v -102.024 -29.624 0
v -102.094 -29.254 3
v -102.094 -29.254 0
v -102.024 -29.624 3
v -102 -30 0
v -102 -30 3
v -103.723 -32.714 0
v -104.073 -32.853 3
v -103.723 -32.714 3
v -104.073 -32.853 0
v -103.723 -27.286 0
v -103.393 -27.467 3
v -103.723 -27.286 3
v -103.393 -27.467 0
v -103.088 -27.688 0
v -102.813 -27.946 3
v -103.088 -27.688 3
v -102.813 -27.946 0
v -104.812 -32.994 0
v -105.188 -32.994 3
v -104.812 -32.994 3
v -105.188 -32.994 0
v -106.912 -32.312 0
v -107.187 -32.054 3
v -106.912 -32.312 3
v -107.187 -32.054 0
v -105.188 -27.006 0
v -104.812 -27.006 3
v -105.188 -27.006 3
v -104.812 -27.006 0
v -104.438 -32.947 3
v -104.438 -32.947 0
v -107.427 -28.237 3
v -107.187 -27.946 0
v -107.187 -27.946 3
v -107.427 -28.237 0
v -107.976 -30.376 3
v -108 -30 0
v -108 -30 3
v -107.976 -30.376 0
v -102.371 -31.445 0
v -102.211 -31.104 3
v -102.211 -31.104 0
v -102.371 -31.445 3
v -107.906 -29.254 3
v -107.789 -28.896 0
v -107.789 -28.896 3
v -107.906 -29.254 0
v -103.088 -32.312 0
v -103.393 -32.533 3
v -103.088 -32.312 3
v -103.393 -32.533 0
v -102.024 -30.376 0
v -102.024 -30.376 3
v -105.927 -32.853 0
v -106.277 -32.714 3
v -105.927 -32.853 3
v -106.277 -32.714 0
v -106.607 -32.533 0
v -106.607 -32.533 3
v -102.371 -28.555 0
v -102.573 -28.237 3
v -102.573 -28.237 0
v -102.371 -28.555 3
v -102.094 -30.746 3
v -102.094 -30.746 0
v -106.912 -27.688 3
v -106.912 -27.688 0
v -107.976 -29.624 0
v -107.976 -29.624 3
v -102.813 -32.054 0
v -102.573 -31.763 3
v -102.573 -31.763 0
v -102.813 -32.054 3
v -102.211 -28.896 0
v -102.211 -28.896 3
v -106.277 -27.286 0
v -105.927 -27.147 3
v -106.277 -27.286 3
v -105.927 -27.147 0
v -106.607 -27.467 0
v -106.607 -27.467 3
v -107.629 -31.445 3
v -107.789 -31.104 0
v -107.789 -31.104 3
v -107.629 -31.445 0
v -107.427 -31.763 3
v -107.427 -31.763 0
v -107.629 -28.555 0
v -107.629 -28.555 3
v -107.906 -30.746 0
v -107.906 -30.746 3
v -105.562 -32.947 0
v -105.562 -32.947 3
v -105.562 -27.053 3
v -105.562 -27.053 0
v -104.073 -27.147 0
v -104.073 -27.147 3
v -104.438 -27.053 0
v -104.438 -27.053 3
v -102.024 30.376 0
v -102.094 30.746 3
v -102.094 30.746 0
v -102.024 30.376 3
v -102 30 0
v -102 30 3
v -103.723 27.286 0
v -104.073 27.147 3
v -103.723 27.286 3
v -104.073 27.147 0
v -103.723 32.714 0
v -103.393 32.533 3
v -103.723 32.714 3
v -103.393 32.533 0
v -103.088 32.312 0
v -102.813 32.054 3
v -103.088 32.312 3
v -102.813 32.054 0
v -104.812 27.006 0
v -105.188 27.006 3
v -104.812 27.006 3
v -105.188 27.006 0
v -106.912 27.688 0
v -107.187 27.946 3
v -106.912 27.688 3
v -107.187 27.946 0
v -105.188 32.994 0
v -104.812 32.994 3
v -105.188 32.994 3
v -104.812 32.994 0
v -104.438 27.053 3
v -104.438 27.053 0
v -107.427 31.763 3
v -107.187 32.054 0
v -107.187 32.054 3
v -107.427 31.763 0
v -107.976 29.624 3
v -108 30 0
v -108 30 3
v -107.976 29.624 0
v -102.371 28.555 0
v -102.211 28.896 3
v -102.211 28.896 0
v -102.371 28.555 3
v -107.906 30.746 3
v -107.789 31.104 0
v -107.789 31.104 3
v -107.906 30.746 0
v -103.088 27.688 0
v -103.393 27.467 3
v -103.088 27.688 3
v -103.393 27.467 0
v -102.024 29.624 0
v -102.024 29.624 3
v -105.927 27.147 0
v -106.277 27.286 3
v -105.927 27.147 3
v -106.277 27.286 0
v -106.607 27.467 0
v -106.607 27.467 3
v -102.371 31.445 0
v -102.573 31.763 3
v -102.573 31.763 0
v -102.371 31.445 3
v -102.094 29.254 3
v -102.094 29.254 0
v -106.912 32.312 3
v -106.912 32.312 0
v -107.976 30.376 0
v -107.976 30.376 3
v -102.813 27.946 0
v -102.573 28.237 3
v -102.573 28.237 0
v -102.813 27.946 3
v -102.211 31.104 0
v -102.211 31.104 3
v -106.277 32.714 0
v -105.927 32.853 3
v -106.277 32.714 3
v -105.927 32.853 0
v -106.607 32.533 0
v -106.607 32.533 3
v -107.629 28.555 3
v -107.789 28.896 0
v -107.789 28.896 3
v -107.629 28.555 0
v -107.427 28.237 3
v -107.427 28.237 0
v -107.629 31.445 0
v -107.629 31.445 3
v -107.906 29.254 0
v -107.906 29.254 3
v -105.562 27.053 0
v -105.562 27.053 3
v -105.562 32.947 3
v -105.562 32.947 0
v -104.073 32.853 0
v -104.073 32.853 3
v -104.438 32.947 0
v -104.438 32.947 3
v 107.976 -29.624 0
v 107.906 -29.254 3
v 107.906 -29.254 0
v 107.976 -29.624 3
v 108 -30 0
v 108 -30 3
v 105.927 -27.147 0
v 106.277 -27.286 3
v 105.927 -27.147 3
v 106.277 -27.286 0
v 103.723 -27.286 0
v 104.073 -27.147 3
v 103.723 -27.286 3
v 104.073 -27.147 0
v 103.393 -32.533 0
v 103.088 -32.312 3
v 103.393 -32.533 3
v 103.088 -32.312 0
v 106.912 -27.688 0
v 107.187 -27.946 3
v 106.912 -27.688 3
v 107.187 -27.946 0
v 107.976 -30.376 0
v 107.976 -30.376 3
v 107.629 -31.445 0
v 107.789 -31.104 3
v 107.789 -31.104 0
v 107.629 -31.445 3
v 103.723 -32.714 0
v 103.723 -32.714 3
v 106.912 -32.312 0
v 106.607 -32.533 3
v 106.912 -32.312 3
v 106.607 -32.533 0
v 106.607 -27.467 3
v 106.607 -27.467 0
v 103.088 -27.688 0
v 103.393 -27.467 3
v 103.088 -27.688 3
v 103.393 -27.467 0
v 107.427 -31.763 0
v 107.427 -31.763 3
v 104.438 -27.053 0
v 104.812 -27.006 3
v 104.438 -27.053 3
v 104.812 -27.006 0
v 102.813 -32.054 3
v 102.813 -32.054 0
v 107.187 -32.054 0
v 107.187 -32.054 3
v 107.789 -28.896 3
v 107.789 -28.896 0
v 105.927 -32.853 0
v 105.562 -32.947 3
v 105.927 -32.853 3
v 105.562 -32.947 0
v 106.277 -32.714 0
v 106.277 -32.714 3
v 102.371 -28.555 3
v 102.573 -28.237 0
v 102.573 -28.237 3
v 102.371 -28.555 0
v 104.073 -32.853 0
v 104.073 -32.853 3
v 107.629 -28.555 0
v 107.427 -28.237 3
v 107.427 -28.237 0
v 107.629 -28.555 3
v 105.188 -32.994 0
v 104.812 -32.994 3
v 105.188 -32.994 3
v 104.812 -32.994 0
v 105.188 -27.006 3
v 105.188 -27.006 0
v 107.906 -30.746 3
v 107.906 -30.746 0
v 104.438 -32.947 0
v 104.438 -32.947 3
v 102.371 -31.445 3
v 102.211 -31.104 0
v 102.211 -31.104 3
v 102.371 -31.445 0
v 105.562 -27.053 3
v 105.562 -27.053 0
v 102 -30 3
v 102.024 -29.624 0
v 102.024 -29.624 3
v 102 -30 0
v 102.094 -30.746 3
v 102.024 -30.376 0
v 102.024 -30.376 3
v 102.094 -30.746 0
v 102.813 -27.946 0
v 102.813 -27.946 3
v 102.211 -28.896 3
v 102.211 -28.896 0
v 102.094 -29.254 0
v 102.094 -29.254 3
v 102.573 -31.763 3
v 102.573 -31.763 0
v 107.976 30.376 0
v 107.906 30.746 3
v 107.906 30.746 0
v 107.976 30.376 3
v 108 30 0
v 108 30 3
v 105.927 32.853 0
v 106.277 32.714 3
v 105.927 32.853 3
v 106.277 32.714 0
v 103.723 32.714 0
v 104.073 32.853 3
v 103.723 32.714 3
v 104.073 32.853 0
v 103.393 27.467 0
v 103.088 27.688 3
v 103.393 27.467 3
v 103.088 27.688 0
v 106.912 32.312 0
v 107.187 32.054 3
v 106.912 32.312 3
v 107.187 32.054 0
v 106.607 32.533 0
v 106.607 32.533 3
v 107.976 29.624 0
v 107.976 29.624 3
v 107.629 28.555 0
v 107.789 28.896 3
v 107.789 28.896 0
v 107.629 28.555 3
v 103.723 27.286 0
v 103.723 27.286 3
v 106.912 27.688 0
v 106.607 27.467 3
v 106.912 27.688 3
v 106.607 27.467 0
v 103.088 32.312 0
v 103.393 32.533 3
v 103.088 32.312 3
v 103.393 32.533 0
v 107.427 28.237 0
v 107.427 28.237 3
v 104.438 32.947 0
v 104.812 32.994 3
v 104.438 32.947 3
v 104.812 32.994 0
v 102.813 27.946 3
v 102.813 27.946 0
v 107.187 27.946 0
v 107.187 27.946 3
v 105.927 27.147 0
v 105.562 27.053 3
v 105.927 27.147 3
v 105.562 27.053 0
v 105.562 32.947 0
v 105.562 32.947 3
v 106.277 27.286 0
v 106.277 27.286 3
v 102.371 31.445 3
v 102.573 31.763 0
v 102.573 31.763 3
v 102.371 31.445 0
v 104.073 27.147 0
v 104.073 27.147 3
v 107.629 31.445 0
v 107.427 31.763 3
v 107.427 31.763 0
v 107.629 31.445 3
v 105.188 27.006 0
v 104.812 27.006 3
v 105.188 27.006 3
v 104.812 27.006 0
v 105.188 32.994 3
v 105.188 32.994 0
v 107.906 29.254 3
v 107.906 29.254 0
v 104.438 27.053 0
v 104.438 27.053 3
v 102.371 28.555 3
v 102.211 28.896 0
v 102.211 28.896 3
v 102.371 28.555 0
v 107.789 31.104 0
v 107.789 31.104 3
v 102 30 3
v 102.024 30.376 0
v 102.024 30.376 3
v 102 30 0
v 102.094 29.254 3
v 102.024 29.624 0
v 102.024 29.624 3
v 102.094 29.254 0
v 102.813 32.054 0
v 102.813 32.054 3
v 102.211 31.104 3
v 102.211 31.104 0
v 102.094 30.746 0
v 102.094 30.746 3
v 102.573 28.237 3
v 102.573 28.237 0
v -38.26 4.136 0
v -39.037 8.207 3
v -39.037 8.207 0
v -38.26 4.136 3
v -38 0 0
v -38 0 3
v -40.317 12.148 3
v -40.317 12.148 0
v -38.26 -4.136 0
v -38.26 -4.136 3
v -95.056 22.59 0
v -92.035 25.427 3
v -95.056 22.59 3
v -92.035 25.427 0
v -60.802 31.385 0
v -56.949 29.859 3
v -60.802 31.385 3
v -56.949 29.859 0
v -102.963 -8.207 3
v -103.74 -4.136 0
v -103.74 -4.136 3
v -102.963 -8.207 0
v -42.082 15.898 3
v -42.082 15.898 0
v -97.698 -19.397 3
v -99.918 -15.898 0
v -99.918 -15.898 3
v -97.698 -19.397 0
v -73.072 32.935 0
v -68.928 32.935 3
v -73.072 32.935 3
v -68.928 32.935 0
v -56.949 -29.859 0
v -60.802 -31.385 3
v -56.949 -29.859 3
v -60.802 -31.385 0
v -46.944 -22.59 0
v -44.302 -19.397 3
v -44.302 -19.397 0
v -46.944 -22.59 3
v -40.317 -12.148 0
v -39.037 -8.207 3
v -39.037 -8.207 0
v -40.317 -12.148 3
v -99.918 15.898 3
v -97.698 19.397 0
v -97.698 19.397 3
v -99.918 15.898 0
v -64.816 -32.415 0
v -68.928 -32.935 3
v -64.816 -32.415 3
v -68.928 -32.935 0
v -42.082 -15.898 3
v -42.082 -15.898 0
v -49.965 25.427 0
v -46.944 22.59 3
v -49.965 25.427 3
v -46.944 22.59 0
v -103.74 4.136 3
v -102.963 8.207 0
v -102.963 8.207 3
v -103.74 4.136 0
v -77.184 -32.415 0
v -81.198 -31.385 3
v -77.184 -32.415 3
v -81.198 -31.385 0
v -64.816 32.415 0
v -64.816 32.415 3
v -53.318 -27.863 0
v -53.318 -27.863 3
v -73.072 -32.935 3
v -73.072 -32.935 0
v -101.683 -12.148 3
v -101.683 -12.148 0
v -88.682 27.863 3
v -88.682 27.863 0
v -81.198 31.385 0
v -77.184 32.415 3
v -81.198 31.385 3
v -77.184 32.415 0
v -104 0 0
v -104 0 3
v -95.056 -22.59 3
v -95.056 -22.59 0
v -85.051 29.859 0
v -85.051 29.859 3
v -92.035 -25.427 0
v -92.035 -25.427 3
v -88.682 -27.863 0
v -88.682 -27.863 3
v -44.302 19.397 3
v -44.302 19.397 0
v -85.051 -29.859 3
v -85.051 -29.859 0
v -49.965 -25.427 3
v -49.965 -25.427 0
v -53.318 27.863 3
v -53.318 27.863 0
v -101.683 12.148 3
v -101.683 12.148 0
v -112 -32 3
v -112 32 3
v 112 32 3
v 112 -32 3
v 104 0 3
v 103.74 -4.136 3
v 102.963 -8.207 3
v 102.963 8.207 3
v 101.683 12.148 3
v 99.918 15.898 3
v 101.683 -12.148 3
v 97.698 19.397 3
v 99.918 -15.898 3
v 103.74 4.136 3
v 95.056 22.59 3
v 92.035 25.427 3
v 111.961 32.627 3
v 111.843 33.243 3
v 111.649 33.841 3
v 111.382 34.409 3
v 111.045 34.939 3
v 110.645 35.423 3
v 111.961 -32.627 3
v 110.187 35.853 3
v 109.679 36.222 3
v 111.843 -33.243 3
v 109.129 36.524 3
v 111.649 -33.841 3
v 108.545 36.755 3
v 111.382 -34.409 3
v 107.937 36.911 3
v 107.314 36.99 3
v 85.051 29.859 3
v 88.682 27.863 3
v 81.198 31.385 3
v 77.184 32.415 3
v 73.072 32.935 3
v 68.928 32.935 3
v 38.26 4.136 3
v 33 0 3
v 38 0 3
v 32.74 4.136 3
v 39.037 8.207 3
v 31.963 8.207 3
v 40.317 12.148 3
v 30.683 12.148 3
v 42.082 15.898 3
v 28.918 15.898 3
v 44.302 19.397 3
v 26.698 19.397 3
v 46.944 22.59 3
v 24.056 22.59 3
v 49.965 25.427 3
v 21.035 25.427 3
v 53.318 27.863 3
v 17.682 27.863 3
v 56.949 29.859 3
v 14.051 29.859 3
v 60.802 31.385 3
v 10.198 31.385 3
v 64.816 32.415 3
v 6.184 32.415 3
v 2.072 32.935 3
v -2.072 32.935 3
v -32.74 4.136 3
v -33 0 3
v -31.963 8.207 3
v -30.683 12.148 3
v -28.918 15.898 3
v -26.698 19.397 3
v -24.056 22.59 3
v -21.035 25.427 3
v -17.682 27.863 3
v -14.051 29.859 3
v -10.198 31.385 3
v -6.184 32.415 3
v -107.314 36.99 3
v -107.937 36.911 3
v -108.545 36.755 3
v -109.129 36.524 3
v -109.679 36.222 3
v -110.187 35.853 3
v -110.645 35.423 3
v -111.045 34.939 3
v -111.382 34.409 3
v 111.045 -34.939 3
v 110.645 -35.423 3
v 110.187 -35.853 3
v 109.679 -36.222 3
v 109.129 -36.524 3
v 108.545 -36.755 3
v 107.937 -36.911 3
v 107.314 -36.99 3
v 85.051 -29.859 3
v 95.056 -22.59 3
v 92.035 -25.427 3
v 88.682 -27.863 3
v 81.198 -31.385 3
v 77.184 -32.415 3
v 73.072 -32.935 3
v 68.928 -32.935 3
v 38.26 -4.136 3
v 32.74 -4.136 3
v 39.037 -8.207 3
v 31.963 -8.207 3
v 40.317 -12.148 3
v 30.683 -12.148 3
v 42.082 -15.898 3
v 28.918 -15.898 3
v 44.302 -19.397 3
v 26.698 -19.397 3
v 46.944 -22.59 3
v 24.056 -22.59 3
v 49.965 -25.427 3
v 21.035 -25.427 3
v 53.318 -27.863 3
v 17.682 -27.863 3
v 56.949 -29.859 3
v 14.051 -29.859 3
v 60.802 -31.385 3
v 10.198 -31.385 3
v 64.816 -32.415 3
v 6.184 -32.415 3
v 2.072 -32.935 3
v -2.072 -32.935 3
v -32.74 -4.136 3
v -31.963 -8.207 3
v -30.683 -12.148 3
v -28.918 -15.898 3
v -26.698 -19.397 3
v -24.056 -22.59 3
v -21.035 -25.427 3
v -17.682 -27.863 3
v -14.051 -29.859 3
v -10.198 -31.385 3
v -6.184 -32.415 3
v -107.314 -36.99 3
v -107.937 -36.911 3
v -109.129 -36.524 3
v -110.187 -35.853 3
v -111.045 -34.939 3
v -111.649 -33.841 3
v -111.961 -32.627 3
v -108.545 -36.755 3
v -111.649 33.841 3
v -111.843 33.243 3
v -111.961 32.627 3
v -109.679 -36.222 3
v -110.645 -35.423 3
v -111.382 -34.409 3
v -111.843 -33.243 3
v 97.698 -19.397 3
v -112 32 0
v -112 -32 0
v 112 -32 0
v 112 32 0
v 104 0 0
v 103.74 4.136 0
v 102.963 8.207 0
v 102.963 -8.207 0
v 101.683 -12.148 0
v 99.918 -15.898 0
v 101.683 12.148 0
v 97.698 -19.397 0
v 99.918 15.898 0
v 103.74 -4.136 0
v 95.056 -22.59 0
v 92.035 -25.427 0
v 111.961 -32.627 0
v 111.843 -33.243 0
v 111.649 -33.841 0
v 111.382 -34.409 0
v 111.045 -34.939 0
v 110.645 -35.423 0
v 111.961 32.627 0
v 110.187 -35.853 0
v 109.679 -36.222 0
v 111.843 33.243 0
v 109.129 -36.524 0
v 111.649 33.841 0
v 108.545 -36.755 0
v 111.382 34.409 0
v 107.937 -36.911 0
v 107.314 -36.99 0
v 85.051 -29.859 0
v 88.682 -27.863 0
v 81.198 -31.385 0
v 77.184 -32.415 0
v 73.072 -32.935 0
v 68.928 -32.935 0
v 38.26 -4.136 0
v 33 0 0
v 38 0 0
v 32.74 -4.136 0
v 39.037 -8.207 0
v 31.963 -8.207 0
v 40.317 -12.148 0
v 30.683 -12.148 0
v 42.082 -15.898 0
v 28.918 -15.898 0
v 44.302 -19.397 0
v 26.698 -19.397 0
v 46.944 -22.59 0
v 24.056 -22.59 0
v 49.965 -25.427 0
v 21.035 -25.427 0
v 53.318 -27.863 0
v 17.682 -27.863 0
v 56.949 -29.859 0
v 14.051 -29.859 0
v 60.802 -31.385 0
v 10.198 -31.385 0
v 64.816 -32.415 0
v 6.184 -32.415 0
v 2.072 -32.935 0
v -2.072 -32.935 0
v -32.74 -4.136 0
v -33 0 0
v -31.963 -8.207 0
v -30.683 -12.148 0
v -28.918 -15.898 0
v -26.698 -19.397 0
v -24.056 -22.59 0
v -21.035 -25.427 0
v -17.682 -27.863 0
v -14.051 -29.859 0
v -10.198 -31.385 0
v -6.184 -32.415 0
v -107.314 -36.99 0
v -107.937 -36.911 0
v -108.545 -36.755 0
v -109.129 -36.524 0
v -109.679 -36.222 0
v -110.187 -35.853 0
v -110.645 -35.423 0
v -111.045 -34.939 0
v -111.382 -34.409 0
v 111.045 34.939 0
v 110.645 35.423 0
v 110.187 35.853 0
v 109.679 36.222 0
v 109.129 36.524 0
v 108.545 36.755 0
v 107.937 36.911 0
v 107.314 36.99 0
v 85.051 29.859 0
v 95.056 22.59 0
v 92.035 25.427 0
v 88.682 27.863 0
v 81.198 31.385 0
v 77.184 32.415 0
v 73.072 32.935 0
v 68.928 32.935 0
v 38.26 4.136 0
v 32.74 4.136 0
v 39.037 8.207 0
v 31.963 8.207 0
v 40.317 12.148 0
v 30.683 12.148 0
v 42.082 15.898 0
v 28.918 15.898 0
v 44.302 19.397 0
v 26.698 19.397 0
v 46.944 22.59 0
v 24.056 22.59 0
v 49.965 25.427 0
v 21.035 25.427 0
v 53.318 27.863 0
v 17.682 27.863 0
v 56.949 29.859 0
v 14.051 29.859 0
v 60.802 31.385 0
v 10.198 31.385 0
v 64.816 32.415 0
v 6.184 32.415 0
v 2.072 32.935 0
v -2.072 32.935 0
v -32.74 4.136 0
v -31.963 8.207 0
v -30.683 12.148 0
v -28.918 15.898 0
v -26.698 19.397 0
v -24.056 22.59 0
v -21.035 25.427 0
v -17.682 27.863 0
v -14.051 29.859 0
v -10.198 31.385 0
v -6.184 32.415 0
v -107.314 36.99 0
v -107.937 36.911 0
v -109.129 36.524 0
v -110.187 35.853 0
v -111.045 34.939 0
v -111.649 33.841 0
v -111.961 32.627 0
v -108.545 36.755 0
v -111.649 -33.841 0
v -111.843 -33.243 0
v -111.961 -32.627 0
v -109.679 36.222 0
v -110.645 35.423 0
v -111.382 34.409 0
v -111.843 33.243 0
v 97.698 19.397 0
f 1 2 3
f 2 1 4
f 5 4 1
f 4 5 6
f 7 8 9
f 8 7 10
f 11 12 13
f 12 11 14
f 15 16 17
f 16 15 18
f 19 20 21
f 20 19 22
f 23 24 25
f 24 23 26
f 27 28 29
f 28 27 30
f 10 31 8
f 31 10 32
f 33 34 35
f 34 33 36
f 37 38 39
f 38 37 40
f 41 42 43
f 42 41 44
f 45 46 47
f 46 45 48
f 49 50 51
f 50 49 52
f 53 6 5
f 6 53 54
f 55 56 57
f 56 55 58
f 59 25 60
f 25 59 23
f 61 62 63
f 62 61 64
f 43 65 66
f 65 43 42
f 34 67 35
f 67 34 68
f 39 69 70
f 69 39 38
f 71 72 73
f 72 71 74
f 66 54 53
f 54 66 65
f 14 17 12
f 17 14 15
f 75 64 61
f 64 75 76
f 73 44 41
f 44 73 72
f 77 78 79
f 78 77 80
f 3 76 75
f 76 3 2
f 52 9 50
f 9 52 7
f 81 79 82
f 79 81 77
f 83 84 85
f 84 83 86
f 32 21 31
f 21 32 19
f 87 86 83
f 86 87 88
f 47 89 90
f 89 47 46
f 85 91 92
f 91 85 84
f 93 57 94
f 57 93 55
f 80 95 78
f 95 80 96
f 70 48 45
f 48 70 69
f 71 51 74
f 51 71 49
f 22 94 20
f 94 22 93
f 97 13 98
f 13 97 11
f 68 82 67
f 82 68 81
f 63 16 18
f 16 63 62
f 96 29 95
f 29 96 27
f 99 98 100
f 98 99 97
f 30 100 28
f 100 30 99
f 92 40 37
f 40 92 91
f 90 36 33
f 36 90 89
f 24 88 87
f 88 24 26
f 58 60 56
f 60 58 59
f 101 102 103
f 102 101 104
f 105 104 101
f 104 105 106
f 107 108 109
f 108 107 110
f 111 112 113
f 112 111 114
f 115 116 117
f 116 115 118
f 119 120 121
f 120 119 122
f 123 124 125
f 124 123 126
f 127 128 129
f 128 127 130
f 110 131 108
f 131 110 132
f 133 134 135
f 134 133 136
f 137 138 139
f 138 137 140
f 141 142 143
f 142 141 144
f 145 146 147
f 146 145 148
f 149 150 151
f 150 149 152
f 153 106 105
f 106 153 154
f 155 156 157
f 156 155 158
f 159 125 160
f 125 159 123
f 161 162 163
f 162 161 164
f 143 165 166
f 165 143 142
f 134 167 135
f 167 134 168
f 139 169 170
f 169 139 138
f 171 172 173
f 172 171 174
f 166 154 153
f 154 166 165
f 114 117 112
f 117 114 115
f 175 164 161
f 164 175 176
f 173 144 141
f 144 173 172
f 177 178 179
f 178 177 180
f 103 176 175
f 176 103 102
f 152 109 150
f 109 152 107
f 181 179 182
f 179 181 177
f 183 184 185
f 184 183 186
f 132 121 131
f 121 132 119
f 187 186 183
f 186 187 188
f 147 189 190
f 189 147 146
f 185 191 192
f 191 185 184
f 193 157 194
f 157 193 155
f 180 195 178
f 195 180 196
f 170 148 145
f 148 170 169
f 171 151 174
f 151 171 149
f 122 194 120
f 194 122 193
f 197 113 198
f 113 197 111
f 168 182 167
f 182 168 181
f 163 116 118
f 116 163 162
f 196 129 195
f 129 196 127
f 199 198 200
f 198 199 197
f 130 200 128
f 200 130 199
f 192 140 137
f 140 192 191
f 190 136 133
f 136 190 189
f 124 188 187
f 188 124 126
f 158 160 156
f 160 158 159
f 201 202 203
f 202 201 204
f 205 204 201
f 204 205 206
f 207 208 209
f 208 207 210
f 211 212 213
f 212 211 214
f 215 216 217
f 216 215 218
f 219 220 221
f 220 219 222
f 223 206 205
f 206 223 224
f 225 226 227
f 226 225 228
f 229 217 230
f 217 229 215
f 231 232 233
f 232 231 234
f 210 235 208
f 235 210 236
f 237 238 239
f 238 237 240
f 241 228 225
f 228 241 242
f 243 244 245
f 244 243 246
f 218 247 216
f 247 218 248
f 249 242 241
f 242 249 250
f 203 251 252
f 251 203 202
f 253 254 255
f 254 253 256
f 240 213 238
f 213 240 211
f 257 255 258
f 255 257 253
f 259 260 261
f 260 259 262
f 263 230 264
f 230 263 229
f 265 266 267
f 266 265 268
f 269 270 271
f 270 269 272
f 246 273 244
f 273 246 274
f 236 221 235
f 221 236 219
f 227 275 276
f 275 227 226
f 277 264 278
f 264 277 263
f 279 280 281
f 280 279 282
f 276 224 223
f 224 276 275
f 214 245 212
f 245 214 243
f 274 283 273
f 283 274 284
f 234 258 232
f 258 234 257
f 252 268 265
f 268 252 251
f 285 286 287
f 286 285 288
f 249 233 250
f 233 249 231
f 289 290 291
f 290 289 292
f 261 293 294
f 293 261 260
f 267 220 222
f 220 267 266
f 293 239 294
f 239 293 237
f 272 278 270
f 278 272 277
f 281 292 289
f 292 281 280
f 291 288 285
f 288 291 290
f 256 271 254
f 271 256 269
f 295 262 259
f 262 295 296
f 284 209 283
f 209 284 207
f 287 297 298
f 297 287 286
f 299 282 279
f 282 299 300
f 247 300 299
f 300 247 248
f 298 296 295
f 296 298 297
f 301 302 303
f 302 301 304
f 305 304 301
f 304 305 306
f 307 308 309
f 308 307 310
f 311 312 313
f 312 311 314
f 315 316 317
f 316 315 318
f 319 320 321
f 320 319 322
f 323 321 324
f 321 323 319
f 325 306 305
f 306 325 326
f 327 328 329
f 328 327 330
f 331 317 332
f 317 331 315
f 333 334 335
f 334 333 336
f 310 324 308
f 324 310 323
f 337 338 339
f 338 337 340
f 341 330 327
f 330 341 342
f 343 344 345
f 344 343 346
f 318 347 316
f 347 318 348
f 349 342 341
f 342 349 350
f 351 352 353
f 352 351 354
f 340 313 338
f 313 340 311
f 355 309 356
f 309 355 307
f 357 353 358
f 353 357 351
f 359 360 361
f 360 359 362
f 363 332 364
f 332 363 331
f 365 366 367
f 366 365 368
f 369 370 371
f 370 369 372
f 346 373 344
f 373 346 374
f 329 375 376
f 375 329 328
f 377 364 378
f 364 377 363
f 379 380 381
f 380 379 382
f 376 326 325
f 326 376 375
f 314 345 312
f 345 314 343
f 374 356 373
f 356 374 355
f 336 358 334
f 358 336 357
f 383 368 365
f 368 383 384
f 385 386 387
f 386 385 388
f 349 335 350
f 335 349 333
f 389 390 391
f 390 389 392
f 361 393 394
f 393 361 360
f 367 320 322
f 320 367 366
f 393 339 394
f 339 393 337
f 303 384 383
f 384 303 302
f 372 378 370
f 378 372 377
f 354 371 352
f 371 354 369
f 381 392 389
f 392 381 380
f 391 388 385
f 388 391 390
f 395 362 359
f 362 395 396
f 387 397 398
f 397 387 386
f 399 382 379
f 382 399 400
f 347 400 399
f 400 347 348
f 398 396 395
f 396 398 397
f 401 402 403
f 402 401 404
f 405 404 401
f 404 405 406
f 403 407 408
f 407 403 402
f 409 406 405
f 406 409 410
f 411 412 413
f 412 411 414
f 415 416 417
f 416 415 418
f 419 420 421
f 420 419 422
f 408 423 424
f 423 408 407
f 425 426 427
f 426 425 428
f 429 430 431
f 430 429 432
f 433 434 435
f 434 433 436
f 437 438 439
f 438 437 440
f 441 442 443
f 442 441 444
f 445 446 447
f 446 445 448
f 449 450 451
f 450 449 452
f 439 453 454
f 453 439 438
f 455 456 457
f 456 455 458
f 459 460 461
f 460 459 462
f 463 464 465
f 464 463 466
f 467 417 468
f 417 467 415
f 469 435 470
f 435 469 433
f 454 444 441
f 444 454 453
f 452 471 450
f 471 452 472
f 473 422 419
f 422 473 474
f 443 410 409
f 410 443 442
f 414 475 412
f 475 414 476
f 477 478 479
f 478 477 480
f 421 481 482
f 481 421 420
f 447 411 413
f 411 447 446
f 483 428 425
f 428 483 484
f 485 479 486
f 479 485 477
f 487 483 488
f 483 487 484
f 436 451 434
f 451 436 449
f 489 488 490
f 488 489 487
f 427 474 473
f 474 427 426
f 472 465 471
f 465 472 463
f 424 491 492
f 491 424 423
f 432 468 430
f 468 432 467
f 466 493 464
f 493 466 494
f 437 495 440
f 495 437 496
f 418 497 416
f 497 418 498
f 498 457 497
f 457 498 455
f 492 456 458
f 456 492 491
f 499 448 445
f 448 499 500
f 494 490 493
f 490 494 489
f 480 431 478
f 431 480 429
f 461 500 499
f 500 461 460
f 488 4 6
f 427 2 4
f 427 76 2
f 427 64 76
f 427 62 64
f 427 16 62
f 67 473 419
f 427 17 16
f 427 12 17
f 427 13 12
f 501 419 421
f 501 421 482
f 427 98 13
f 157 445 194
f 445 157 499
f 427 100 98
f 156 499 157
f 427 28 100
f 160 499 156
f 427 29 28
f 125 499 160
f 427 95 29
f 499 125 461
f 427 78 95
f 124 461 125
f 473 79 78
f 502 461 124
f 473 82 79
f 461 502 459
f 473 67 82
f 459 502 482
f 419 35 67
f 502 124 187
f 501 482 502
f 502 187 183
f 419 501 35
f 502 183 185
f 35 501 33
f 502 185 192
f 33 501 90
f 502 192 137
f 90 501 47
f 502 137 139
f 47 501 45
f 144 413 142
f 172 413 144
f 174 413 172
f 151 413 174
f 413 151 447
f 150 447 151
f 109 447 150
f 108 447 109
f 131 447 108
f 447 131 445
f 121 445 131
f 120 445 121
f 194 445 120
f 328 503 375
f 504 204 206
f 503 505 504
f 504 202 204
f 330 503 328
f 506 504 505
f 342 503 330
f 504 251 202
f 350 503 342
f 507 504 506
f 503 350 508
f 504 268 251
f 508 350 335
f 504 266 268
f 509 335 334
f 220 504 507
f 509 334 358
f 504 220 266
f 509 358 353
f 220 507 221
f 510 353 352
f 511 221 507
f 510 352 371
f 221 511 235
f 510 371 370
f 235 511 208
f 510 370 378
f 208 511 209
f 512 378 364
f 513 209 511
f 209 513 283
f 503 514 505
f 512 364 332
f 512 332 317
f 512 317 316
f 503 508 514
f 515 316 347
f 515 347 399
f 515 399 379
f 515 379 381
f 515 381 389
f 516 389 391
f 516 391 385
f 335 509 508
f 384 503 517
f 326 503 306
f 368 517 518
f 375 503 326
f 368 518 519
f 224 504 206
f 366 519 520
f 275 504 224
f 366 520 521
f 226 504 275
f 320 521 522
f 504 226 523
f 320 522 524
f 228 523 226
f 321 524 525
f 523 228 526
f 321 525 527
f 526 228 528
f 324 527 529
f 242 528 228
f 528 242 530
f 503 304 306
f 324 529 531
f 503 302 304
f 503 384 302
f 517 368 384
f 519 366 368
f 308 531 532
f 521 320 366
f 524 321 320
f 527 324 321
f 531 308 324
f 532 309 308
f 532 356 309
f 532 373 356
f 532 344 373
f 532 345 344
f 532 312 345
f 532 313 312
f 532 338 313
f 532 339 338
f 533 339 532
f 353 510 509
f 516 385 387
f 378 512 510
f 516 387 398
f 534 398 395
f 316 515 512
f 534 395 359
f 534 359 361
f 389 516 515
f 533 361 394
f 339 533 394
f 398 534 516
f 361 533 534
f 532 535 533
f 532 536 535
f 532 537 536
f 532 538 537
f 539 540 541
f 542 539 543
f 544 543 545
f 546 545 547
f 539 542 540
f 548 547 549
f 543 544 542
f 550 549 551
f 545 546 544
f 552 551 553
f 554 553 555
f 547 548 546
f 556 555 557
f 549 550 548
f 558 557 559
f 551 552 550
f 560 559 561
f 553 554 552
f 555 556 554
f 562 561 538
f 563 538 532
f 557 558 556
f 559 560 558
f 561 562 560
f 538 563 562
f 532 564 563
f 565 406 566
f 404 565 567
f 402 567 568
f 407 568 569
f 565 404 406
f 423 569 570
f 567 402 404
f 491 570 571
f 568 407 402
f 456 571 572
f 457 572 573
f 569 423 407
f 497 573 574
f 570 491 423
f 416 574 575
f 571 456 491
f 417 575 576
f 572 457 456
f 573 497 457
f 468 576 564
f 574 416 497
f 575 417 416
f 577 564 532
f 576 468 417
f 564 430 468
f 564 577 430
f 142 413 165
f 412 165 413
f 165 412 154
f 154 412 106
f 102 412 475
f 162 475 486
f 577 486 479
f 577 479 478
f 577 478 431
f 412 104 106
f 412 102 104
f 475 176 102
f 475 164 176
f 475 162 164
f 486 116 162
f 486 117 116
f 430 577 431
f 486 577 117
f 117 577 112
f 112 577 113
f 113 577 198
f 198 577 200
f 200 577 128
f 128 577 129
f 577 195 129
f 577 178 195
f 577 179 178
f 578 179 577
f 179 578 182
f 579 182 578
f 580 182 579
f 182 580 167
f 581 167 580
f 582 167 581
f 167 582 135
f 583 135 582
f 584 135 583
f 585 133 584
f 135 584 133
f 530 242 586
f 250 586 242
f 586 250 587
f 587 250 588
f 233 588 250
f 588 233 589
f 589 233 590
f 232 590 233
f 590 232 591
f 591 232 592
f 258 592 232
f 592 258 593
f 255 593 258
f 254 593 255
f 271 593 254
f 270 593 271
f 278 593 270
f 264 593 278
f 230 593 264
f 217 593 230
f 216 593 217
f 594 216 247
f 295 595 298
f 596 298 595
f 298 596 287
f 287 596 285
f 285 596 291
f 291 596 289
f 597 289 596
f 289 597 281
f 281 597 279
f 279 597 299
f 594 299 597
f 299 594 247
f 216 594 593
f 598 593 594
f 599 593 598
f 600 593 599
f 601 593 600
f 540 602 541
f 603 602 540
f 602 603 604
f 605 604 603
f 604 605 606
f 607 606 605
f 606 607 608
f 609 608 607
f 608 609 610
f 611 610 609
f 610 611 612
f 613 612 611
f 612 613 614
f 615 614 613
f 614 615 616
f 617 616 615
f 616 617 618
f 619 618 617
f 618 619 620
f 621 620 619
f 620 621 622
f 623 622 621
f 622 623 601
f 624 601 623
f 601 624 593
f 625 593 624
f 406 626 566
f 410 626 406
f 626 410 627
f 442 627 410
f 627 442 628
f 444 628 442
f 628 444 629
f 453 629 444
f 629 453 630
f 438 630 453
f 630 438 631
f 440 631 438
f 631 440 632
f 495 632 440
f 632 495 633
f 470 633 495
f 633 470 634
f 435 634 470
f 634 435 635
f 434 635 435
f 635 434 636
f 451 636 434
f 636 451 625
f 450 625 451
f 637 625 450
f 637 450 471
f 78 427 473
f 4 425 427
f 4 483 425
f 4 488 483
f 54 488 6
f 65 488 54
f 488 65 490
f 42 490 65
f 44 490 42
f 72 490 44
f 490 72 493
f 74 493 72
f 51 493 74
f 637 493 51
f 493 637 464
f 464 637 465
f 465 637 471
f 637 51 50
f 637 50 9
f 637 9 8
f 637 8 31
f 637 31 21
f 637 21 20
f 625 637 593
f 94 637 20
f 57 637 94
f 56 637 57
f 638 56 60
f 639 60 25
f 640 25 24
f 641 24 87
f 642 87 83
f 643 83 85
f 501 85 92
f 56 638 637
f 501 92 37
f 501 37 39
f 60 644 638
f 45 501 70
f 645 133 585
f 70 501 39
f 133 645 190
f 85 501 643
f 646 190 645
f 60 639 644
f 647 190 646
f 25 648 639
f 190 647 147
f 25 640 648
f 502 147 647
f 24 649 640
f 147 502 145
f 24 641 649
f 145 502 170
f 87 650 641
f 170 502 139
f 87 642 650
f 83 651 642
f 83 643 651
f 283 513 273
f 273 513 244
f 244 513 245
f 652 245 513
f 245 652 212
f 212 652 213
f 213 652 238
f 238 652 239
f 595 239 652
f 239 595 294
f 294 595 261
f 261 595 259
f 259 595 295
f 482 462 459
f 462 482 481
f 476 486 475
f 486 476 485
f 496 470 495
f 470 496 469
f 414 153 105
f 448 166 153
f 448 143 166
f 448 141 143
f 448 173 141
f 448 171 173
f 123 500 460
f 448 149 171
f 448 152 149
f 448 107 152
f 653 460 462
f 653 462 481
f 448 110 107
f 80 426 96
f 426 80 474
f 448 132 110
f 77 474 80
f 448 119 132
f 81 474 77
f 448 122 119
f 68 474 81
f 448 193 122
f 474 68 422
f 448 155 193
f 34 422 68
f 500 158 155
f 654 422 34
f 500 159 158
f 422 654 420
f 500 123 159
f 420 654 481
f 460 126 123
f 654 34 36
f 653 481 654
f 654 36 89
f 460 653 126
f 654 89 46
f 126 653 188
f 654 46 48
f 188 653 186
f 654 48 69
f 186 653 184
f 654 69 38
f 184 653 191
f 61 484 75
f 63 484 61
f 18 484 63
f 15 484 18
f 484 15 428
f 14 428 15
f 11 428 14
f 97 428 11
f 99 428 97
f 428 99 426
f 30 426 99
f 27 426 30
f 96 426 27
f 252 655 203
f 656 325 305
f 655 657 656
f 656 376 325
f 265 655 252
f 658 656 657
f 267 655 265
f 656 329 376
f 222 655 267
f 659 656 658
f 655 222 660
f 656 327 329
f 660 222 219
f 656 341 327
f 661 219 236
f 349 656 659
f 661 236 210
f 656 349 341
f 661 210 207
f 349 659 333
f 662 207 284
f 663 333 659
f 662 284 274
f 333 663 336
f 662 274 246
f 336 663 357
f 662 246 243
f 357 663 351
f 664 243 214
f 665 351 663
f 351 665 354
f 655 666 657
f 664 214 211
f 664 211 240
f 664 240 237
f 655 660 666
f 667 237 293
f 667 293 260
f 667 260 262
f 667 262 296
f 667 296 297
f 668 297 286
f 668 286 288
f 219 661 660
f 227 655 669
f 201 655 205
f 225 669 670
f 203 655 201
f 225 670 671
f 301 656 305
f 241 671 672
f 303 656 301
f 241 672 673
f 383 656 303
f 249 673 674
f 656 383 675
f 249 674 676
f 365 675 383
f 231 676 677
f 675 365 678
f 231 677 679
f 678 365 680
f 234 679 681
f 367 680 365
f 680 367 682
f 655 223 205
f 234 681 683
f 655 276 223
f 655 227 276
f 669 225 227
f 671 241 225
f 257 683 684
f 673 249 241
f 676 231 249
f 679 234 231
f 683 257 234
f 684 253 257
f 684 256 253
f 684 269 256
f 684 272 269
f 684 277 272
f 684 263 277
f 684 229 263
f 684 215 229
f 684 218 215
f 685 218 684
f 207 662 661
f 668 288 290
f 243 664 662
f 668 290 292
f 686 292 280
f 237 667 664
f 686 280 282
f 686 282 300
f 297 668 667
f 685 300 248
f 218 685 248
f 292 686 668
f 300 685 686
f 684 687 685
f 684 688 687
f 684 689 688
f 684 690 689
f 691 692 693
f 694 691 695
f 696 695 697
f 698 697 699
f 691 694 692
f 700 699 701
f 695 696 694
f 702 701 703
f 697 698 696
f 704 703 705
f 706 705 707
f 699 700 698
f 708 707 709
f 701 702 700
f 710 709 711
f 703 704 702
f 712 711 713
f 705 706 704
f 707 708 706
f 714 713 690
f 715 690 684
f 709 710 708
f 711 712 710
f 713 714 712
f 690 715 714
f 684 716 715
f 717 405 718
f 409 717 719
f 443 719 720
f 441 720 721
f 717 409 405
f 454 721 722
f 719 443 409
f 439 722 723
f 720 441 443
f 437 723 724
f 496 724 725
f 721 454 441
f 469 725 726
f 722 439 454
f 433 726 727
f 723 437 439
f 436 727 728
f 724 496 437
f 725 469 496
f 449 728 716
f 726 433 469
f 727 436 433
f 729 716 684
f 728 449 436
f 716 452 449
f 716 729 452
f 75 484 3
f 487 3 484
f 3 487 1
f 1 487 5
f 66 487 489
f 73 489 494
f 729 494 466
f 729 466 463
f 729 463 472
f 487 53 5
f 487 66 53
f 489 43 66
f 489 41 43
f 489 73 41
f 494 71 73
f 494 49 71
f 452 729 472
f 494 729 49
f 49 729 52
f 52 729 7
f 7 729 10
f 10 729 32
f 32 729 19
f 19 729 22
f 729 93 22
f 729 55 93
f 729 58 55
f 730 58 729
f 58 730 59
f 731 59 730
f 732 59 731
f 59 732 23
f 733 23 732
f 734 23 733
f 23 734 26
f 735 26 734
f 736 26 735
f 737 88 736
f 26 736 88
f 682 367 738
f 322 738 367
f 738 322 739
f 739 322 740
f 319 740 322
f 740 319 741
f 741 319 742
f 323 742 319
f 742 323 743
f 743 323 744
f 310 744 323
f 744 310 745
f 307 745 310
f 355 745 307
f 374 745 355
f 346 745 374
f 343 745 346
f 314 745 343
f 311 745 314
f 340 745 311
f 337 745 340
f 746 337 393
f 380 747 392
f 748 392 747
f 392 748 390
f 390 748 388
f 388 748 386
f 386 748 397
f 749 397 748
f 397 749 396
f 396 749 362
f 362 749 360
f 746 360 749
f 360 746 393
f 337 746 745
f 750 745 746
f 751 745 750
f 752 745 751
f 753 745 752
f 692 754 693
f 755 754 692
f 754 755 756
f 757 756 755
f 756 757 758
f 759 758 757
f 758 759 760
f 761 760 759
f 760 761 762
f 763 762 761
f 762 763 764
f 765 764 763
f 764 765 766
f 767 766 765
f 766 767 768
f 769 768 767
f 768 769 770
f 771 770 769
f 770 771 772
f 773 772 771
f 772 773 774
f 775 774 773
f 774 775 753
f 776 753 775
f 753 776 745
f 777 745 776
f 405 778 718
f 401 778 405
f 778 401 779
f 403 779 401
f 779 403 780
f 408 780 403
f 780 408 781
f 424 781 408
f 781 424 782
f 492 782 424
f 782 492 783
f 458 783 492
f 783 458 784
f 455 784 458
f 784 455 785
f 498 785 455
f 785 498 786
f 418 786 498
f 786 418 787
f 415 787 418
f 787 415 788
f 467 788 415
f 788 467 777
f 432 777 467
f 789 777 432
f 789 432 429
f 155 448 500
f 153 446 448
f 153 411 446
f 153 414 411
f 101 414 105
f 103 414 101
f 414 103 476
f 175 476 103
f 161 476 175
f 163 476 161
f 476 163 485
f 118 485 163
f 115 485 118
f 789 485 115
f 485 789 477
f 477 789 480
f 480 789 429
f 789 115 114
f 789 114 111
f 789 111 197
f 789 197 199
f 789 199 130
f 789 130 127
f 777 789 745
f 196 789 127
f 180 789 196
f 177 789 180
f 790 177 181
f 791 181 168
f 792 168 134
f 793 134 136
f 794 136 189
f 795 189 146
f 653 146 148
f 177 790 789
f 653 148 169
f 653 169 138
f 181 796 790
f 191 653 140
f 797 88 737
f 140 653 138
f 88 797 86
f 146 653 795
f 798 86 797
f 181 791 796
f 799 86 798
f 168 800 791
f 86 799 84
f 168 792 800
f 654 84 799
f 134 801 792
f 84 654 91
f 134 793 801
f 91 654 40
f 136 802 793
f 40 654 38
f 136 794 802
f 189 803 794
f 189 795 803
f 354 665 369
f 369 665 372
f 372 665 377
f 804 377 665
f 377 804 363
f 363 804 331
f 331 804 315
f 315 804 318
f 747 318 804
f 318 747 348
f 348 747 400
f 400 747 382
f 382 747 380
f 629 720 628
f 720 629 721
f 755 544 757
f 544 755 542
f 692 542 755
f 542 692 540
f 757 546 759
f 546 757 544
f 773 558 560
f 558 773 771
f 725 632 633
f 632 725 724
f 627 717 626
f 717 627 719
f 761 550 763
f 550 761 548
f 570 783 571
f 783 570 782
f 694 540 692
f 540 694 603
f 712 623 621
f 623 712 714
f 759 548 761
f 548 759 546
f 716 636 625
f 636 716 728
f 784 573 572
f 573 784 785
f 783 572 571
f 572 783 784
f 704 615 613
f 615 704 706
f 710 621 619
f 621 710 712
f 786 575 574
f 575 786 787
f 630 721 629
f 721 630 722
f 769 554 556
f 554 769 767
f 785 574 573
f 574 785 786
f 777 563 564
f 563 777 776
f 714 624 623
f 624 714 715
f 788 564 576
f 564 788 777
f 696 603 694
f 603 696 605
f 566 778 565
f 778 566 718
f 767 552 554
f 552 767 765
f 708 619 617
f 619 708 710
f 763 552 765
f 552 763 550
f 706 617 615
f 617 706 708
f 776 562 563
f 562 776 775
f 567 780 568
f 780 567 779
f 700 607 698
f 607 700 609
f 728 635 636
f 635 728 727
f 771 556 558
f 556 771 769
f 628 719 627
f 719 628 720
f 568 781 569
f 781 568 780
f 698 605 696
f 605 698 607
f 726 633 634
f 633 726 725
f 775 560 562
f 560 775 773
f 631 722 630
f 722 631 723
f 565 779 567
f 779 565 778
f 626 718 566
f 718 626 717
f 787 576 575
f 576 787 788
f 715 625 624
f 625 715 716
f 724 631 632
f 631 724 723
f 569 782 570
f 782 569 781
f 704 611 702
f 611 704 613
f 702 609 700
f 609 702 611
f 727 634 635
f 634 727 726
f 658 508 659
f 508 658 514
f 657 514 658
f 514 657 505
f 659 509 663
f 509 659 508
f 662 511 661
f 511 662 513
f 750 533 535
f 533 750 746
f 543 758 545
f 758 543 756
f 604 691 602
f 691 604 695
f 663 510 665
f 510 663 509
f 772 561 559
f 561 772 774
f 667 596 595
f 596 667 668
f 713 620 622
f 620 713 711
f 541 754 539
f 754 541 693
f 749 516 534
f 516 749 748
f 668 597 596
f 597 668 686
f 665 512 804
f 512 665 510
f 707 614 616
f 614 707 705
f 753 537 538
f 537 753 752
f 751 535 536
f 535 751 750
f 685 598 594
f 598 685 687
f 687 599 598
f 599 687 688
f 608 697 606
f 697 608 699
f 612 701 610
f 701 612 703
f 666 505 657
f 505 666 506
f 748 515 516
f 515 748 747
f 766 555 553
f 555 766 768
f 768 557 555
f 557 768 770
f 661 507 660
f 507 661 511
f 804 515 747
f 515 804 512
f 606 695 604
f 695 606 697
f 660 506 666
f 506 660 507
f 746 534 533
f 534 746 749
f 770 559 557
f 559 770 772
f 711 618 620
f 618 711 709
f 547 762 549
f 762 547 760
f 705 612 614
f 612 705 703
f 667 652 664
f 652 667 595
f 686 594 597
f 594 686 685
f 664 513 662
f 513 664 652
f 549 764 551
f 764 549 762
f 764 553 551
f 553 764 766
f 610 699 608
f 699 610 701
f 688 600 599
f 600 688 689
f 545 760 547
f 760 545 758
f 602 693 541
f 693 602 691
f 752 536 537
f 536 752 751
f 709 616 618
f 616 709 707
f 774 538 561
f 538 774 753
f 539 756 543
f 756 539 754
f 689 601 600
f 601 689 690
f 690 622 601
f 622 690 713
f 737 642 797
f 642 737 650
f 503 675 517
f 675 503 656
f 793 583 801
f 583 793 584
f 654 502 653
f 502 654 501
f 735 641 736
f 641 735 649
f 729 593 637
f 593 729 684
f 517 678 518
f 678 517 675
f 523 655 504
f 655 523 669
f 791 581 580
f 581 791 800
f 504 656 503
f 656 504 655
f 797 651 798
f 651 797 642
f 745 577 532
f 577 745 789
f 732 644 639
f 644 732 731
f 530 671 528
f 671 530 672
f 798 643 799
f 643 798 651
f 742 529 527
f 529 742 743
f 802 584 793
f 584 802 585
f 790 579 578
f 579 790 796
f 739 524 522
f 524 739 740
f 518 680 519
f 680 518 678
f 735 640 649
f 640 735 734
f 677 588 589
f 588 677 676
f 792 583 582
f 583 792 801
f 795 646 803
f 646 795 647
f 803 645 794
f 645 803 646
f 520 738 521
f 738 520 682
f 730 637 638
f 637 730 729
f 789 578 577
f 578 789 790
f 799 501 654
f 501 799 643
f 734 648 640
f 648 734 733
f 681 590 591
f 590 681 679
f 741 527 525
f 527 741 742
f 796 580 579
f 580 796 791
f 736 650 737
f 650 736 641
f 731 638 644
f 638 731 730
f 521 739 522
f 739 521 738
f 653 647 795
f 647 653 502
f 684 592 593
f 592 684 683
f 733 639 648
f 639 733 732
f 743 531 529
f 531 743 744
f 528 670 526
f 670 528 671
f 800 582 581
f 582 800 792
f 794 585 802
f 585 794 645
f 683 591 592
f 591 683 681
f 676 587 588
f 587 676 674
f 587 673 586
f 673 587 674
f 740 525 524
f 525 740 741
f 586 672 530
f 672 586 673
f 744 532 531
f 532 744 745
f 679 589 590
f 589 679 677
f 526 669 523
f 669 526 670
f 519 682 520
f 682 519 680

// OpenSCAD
$fn = 50;


difference() {
	union() {
		hull() {
			translate(v = [-107.0000000000, 32.0000000000, 0]) {
				cylinder(h = 3, r = 5);
			}
			translate(v = [107.0000000000, 32.0000000000, 0]) {
				cylinder(h = 3, r = 5);
			}
			translate(v = [-107.0000000000, -32.0000000000, 0]) {
				cylinder(h = 3, r = 5);
			}
			translate(v = [107.0000000000, -32.0000000000, 0]) {
				cylinder(h = 3, r = 5);
			}
		}
	}
	union() {
		#translate(v = [-105.0000000000, -30.0000000000, -100.0000000000]) {
			cylinder(h = 200, r = 3.0000000000);
		}
		#translate(v = [-105.0000000000, 30.0000000000, -100.0000000000]) {
			cylinder(h = 200, r = 3.0000000000);
		}
		#translate(v = [105.0000000000, -30.0000000000, -100.0000000000]) {
			cylinder(h = 200, r = 3.0000000000);
		}
		#translate(v = [105.0000000000, 30.0000000000, -100.0000000000]) {
			cylinder(h = 200, r = 3.0000000000);
		}
		#translate(v = [-71.0000000000, 0, 0]) {
			cylinder(h = 3, r = 33.0000000000);
		}
		#cylinder(h = 3, r = 33.0000000000);
		#translate(v = [71.0000000000, 0, 0]) {
			cylinder(h = 3, r = 33.0000000000);
		}
	}
}
